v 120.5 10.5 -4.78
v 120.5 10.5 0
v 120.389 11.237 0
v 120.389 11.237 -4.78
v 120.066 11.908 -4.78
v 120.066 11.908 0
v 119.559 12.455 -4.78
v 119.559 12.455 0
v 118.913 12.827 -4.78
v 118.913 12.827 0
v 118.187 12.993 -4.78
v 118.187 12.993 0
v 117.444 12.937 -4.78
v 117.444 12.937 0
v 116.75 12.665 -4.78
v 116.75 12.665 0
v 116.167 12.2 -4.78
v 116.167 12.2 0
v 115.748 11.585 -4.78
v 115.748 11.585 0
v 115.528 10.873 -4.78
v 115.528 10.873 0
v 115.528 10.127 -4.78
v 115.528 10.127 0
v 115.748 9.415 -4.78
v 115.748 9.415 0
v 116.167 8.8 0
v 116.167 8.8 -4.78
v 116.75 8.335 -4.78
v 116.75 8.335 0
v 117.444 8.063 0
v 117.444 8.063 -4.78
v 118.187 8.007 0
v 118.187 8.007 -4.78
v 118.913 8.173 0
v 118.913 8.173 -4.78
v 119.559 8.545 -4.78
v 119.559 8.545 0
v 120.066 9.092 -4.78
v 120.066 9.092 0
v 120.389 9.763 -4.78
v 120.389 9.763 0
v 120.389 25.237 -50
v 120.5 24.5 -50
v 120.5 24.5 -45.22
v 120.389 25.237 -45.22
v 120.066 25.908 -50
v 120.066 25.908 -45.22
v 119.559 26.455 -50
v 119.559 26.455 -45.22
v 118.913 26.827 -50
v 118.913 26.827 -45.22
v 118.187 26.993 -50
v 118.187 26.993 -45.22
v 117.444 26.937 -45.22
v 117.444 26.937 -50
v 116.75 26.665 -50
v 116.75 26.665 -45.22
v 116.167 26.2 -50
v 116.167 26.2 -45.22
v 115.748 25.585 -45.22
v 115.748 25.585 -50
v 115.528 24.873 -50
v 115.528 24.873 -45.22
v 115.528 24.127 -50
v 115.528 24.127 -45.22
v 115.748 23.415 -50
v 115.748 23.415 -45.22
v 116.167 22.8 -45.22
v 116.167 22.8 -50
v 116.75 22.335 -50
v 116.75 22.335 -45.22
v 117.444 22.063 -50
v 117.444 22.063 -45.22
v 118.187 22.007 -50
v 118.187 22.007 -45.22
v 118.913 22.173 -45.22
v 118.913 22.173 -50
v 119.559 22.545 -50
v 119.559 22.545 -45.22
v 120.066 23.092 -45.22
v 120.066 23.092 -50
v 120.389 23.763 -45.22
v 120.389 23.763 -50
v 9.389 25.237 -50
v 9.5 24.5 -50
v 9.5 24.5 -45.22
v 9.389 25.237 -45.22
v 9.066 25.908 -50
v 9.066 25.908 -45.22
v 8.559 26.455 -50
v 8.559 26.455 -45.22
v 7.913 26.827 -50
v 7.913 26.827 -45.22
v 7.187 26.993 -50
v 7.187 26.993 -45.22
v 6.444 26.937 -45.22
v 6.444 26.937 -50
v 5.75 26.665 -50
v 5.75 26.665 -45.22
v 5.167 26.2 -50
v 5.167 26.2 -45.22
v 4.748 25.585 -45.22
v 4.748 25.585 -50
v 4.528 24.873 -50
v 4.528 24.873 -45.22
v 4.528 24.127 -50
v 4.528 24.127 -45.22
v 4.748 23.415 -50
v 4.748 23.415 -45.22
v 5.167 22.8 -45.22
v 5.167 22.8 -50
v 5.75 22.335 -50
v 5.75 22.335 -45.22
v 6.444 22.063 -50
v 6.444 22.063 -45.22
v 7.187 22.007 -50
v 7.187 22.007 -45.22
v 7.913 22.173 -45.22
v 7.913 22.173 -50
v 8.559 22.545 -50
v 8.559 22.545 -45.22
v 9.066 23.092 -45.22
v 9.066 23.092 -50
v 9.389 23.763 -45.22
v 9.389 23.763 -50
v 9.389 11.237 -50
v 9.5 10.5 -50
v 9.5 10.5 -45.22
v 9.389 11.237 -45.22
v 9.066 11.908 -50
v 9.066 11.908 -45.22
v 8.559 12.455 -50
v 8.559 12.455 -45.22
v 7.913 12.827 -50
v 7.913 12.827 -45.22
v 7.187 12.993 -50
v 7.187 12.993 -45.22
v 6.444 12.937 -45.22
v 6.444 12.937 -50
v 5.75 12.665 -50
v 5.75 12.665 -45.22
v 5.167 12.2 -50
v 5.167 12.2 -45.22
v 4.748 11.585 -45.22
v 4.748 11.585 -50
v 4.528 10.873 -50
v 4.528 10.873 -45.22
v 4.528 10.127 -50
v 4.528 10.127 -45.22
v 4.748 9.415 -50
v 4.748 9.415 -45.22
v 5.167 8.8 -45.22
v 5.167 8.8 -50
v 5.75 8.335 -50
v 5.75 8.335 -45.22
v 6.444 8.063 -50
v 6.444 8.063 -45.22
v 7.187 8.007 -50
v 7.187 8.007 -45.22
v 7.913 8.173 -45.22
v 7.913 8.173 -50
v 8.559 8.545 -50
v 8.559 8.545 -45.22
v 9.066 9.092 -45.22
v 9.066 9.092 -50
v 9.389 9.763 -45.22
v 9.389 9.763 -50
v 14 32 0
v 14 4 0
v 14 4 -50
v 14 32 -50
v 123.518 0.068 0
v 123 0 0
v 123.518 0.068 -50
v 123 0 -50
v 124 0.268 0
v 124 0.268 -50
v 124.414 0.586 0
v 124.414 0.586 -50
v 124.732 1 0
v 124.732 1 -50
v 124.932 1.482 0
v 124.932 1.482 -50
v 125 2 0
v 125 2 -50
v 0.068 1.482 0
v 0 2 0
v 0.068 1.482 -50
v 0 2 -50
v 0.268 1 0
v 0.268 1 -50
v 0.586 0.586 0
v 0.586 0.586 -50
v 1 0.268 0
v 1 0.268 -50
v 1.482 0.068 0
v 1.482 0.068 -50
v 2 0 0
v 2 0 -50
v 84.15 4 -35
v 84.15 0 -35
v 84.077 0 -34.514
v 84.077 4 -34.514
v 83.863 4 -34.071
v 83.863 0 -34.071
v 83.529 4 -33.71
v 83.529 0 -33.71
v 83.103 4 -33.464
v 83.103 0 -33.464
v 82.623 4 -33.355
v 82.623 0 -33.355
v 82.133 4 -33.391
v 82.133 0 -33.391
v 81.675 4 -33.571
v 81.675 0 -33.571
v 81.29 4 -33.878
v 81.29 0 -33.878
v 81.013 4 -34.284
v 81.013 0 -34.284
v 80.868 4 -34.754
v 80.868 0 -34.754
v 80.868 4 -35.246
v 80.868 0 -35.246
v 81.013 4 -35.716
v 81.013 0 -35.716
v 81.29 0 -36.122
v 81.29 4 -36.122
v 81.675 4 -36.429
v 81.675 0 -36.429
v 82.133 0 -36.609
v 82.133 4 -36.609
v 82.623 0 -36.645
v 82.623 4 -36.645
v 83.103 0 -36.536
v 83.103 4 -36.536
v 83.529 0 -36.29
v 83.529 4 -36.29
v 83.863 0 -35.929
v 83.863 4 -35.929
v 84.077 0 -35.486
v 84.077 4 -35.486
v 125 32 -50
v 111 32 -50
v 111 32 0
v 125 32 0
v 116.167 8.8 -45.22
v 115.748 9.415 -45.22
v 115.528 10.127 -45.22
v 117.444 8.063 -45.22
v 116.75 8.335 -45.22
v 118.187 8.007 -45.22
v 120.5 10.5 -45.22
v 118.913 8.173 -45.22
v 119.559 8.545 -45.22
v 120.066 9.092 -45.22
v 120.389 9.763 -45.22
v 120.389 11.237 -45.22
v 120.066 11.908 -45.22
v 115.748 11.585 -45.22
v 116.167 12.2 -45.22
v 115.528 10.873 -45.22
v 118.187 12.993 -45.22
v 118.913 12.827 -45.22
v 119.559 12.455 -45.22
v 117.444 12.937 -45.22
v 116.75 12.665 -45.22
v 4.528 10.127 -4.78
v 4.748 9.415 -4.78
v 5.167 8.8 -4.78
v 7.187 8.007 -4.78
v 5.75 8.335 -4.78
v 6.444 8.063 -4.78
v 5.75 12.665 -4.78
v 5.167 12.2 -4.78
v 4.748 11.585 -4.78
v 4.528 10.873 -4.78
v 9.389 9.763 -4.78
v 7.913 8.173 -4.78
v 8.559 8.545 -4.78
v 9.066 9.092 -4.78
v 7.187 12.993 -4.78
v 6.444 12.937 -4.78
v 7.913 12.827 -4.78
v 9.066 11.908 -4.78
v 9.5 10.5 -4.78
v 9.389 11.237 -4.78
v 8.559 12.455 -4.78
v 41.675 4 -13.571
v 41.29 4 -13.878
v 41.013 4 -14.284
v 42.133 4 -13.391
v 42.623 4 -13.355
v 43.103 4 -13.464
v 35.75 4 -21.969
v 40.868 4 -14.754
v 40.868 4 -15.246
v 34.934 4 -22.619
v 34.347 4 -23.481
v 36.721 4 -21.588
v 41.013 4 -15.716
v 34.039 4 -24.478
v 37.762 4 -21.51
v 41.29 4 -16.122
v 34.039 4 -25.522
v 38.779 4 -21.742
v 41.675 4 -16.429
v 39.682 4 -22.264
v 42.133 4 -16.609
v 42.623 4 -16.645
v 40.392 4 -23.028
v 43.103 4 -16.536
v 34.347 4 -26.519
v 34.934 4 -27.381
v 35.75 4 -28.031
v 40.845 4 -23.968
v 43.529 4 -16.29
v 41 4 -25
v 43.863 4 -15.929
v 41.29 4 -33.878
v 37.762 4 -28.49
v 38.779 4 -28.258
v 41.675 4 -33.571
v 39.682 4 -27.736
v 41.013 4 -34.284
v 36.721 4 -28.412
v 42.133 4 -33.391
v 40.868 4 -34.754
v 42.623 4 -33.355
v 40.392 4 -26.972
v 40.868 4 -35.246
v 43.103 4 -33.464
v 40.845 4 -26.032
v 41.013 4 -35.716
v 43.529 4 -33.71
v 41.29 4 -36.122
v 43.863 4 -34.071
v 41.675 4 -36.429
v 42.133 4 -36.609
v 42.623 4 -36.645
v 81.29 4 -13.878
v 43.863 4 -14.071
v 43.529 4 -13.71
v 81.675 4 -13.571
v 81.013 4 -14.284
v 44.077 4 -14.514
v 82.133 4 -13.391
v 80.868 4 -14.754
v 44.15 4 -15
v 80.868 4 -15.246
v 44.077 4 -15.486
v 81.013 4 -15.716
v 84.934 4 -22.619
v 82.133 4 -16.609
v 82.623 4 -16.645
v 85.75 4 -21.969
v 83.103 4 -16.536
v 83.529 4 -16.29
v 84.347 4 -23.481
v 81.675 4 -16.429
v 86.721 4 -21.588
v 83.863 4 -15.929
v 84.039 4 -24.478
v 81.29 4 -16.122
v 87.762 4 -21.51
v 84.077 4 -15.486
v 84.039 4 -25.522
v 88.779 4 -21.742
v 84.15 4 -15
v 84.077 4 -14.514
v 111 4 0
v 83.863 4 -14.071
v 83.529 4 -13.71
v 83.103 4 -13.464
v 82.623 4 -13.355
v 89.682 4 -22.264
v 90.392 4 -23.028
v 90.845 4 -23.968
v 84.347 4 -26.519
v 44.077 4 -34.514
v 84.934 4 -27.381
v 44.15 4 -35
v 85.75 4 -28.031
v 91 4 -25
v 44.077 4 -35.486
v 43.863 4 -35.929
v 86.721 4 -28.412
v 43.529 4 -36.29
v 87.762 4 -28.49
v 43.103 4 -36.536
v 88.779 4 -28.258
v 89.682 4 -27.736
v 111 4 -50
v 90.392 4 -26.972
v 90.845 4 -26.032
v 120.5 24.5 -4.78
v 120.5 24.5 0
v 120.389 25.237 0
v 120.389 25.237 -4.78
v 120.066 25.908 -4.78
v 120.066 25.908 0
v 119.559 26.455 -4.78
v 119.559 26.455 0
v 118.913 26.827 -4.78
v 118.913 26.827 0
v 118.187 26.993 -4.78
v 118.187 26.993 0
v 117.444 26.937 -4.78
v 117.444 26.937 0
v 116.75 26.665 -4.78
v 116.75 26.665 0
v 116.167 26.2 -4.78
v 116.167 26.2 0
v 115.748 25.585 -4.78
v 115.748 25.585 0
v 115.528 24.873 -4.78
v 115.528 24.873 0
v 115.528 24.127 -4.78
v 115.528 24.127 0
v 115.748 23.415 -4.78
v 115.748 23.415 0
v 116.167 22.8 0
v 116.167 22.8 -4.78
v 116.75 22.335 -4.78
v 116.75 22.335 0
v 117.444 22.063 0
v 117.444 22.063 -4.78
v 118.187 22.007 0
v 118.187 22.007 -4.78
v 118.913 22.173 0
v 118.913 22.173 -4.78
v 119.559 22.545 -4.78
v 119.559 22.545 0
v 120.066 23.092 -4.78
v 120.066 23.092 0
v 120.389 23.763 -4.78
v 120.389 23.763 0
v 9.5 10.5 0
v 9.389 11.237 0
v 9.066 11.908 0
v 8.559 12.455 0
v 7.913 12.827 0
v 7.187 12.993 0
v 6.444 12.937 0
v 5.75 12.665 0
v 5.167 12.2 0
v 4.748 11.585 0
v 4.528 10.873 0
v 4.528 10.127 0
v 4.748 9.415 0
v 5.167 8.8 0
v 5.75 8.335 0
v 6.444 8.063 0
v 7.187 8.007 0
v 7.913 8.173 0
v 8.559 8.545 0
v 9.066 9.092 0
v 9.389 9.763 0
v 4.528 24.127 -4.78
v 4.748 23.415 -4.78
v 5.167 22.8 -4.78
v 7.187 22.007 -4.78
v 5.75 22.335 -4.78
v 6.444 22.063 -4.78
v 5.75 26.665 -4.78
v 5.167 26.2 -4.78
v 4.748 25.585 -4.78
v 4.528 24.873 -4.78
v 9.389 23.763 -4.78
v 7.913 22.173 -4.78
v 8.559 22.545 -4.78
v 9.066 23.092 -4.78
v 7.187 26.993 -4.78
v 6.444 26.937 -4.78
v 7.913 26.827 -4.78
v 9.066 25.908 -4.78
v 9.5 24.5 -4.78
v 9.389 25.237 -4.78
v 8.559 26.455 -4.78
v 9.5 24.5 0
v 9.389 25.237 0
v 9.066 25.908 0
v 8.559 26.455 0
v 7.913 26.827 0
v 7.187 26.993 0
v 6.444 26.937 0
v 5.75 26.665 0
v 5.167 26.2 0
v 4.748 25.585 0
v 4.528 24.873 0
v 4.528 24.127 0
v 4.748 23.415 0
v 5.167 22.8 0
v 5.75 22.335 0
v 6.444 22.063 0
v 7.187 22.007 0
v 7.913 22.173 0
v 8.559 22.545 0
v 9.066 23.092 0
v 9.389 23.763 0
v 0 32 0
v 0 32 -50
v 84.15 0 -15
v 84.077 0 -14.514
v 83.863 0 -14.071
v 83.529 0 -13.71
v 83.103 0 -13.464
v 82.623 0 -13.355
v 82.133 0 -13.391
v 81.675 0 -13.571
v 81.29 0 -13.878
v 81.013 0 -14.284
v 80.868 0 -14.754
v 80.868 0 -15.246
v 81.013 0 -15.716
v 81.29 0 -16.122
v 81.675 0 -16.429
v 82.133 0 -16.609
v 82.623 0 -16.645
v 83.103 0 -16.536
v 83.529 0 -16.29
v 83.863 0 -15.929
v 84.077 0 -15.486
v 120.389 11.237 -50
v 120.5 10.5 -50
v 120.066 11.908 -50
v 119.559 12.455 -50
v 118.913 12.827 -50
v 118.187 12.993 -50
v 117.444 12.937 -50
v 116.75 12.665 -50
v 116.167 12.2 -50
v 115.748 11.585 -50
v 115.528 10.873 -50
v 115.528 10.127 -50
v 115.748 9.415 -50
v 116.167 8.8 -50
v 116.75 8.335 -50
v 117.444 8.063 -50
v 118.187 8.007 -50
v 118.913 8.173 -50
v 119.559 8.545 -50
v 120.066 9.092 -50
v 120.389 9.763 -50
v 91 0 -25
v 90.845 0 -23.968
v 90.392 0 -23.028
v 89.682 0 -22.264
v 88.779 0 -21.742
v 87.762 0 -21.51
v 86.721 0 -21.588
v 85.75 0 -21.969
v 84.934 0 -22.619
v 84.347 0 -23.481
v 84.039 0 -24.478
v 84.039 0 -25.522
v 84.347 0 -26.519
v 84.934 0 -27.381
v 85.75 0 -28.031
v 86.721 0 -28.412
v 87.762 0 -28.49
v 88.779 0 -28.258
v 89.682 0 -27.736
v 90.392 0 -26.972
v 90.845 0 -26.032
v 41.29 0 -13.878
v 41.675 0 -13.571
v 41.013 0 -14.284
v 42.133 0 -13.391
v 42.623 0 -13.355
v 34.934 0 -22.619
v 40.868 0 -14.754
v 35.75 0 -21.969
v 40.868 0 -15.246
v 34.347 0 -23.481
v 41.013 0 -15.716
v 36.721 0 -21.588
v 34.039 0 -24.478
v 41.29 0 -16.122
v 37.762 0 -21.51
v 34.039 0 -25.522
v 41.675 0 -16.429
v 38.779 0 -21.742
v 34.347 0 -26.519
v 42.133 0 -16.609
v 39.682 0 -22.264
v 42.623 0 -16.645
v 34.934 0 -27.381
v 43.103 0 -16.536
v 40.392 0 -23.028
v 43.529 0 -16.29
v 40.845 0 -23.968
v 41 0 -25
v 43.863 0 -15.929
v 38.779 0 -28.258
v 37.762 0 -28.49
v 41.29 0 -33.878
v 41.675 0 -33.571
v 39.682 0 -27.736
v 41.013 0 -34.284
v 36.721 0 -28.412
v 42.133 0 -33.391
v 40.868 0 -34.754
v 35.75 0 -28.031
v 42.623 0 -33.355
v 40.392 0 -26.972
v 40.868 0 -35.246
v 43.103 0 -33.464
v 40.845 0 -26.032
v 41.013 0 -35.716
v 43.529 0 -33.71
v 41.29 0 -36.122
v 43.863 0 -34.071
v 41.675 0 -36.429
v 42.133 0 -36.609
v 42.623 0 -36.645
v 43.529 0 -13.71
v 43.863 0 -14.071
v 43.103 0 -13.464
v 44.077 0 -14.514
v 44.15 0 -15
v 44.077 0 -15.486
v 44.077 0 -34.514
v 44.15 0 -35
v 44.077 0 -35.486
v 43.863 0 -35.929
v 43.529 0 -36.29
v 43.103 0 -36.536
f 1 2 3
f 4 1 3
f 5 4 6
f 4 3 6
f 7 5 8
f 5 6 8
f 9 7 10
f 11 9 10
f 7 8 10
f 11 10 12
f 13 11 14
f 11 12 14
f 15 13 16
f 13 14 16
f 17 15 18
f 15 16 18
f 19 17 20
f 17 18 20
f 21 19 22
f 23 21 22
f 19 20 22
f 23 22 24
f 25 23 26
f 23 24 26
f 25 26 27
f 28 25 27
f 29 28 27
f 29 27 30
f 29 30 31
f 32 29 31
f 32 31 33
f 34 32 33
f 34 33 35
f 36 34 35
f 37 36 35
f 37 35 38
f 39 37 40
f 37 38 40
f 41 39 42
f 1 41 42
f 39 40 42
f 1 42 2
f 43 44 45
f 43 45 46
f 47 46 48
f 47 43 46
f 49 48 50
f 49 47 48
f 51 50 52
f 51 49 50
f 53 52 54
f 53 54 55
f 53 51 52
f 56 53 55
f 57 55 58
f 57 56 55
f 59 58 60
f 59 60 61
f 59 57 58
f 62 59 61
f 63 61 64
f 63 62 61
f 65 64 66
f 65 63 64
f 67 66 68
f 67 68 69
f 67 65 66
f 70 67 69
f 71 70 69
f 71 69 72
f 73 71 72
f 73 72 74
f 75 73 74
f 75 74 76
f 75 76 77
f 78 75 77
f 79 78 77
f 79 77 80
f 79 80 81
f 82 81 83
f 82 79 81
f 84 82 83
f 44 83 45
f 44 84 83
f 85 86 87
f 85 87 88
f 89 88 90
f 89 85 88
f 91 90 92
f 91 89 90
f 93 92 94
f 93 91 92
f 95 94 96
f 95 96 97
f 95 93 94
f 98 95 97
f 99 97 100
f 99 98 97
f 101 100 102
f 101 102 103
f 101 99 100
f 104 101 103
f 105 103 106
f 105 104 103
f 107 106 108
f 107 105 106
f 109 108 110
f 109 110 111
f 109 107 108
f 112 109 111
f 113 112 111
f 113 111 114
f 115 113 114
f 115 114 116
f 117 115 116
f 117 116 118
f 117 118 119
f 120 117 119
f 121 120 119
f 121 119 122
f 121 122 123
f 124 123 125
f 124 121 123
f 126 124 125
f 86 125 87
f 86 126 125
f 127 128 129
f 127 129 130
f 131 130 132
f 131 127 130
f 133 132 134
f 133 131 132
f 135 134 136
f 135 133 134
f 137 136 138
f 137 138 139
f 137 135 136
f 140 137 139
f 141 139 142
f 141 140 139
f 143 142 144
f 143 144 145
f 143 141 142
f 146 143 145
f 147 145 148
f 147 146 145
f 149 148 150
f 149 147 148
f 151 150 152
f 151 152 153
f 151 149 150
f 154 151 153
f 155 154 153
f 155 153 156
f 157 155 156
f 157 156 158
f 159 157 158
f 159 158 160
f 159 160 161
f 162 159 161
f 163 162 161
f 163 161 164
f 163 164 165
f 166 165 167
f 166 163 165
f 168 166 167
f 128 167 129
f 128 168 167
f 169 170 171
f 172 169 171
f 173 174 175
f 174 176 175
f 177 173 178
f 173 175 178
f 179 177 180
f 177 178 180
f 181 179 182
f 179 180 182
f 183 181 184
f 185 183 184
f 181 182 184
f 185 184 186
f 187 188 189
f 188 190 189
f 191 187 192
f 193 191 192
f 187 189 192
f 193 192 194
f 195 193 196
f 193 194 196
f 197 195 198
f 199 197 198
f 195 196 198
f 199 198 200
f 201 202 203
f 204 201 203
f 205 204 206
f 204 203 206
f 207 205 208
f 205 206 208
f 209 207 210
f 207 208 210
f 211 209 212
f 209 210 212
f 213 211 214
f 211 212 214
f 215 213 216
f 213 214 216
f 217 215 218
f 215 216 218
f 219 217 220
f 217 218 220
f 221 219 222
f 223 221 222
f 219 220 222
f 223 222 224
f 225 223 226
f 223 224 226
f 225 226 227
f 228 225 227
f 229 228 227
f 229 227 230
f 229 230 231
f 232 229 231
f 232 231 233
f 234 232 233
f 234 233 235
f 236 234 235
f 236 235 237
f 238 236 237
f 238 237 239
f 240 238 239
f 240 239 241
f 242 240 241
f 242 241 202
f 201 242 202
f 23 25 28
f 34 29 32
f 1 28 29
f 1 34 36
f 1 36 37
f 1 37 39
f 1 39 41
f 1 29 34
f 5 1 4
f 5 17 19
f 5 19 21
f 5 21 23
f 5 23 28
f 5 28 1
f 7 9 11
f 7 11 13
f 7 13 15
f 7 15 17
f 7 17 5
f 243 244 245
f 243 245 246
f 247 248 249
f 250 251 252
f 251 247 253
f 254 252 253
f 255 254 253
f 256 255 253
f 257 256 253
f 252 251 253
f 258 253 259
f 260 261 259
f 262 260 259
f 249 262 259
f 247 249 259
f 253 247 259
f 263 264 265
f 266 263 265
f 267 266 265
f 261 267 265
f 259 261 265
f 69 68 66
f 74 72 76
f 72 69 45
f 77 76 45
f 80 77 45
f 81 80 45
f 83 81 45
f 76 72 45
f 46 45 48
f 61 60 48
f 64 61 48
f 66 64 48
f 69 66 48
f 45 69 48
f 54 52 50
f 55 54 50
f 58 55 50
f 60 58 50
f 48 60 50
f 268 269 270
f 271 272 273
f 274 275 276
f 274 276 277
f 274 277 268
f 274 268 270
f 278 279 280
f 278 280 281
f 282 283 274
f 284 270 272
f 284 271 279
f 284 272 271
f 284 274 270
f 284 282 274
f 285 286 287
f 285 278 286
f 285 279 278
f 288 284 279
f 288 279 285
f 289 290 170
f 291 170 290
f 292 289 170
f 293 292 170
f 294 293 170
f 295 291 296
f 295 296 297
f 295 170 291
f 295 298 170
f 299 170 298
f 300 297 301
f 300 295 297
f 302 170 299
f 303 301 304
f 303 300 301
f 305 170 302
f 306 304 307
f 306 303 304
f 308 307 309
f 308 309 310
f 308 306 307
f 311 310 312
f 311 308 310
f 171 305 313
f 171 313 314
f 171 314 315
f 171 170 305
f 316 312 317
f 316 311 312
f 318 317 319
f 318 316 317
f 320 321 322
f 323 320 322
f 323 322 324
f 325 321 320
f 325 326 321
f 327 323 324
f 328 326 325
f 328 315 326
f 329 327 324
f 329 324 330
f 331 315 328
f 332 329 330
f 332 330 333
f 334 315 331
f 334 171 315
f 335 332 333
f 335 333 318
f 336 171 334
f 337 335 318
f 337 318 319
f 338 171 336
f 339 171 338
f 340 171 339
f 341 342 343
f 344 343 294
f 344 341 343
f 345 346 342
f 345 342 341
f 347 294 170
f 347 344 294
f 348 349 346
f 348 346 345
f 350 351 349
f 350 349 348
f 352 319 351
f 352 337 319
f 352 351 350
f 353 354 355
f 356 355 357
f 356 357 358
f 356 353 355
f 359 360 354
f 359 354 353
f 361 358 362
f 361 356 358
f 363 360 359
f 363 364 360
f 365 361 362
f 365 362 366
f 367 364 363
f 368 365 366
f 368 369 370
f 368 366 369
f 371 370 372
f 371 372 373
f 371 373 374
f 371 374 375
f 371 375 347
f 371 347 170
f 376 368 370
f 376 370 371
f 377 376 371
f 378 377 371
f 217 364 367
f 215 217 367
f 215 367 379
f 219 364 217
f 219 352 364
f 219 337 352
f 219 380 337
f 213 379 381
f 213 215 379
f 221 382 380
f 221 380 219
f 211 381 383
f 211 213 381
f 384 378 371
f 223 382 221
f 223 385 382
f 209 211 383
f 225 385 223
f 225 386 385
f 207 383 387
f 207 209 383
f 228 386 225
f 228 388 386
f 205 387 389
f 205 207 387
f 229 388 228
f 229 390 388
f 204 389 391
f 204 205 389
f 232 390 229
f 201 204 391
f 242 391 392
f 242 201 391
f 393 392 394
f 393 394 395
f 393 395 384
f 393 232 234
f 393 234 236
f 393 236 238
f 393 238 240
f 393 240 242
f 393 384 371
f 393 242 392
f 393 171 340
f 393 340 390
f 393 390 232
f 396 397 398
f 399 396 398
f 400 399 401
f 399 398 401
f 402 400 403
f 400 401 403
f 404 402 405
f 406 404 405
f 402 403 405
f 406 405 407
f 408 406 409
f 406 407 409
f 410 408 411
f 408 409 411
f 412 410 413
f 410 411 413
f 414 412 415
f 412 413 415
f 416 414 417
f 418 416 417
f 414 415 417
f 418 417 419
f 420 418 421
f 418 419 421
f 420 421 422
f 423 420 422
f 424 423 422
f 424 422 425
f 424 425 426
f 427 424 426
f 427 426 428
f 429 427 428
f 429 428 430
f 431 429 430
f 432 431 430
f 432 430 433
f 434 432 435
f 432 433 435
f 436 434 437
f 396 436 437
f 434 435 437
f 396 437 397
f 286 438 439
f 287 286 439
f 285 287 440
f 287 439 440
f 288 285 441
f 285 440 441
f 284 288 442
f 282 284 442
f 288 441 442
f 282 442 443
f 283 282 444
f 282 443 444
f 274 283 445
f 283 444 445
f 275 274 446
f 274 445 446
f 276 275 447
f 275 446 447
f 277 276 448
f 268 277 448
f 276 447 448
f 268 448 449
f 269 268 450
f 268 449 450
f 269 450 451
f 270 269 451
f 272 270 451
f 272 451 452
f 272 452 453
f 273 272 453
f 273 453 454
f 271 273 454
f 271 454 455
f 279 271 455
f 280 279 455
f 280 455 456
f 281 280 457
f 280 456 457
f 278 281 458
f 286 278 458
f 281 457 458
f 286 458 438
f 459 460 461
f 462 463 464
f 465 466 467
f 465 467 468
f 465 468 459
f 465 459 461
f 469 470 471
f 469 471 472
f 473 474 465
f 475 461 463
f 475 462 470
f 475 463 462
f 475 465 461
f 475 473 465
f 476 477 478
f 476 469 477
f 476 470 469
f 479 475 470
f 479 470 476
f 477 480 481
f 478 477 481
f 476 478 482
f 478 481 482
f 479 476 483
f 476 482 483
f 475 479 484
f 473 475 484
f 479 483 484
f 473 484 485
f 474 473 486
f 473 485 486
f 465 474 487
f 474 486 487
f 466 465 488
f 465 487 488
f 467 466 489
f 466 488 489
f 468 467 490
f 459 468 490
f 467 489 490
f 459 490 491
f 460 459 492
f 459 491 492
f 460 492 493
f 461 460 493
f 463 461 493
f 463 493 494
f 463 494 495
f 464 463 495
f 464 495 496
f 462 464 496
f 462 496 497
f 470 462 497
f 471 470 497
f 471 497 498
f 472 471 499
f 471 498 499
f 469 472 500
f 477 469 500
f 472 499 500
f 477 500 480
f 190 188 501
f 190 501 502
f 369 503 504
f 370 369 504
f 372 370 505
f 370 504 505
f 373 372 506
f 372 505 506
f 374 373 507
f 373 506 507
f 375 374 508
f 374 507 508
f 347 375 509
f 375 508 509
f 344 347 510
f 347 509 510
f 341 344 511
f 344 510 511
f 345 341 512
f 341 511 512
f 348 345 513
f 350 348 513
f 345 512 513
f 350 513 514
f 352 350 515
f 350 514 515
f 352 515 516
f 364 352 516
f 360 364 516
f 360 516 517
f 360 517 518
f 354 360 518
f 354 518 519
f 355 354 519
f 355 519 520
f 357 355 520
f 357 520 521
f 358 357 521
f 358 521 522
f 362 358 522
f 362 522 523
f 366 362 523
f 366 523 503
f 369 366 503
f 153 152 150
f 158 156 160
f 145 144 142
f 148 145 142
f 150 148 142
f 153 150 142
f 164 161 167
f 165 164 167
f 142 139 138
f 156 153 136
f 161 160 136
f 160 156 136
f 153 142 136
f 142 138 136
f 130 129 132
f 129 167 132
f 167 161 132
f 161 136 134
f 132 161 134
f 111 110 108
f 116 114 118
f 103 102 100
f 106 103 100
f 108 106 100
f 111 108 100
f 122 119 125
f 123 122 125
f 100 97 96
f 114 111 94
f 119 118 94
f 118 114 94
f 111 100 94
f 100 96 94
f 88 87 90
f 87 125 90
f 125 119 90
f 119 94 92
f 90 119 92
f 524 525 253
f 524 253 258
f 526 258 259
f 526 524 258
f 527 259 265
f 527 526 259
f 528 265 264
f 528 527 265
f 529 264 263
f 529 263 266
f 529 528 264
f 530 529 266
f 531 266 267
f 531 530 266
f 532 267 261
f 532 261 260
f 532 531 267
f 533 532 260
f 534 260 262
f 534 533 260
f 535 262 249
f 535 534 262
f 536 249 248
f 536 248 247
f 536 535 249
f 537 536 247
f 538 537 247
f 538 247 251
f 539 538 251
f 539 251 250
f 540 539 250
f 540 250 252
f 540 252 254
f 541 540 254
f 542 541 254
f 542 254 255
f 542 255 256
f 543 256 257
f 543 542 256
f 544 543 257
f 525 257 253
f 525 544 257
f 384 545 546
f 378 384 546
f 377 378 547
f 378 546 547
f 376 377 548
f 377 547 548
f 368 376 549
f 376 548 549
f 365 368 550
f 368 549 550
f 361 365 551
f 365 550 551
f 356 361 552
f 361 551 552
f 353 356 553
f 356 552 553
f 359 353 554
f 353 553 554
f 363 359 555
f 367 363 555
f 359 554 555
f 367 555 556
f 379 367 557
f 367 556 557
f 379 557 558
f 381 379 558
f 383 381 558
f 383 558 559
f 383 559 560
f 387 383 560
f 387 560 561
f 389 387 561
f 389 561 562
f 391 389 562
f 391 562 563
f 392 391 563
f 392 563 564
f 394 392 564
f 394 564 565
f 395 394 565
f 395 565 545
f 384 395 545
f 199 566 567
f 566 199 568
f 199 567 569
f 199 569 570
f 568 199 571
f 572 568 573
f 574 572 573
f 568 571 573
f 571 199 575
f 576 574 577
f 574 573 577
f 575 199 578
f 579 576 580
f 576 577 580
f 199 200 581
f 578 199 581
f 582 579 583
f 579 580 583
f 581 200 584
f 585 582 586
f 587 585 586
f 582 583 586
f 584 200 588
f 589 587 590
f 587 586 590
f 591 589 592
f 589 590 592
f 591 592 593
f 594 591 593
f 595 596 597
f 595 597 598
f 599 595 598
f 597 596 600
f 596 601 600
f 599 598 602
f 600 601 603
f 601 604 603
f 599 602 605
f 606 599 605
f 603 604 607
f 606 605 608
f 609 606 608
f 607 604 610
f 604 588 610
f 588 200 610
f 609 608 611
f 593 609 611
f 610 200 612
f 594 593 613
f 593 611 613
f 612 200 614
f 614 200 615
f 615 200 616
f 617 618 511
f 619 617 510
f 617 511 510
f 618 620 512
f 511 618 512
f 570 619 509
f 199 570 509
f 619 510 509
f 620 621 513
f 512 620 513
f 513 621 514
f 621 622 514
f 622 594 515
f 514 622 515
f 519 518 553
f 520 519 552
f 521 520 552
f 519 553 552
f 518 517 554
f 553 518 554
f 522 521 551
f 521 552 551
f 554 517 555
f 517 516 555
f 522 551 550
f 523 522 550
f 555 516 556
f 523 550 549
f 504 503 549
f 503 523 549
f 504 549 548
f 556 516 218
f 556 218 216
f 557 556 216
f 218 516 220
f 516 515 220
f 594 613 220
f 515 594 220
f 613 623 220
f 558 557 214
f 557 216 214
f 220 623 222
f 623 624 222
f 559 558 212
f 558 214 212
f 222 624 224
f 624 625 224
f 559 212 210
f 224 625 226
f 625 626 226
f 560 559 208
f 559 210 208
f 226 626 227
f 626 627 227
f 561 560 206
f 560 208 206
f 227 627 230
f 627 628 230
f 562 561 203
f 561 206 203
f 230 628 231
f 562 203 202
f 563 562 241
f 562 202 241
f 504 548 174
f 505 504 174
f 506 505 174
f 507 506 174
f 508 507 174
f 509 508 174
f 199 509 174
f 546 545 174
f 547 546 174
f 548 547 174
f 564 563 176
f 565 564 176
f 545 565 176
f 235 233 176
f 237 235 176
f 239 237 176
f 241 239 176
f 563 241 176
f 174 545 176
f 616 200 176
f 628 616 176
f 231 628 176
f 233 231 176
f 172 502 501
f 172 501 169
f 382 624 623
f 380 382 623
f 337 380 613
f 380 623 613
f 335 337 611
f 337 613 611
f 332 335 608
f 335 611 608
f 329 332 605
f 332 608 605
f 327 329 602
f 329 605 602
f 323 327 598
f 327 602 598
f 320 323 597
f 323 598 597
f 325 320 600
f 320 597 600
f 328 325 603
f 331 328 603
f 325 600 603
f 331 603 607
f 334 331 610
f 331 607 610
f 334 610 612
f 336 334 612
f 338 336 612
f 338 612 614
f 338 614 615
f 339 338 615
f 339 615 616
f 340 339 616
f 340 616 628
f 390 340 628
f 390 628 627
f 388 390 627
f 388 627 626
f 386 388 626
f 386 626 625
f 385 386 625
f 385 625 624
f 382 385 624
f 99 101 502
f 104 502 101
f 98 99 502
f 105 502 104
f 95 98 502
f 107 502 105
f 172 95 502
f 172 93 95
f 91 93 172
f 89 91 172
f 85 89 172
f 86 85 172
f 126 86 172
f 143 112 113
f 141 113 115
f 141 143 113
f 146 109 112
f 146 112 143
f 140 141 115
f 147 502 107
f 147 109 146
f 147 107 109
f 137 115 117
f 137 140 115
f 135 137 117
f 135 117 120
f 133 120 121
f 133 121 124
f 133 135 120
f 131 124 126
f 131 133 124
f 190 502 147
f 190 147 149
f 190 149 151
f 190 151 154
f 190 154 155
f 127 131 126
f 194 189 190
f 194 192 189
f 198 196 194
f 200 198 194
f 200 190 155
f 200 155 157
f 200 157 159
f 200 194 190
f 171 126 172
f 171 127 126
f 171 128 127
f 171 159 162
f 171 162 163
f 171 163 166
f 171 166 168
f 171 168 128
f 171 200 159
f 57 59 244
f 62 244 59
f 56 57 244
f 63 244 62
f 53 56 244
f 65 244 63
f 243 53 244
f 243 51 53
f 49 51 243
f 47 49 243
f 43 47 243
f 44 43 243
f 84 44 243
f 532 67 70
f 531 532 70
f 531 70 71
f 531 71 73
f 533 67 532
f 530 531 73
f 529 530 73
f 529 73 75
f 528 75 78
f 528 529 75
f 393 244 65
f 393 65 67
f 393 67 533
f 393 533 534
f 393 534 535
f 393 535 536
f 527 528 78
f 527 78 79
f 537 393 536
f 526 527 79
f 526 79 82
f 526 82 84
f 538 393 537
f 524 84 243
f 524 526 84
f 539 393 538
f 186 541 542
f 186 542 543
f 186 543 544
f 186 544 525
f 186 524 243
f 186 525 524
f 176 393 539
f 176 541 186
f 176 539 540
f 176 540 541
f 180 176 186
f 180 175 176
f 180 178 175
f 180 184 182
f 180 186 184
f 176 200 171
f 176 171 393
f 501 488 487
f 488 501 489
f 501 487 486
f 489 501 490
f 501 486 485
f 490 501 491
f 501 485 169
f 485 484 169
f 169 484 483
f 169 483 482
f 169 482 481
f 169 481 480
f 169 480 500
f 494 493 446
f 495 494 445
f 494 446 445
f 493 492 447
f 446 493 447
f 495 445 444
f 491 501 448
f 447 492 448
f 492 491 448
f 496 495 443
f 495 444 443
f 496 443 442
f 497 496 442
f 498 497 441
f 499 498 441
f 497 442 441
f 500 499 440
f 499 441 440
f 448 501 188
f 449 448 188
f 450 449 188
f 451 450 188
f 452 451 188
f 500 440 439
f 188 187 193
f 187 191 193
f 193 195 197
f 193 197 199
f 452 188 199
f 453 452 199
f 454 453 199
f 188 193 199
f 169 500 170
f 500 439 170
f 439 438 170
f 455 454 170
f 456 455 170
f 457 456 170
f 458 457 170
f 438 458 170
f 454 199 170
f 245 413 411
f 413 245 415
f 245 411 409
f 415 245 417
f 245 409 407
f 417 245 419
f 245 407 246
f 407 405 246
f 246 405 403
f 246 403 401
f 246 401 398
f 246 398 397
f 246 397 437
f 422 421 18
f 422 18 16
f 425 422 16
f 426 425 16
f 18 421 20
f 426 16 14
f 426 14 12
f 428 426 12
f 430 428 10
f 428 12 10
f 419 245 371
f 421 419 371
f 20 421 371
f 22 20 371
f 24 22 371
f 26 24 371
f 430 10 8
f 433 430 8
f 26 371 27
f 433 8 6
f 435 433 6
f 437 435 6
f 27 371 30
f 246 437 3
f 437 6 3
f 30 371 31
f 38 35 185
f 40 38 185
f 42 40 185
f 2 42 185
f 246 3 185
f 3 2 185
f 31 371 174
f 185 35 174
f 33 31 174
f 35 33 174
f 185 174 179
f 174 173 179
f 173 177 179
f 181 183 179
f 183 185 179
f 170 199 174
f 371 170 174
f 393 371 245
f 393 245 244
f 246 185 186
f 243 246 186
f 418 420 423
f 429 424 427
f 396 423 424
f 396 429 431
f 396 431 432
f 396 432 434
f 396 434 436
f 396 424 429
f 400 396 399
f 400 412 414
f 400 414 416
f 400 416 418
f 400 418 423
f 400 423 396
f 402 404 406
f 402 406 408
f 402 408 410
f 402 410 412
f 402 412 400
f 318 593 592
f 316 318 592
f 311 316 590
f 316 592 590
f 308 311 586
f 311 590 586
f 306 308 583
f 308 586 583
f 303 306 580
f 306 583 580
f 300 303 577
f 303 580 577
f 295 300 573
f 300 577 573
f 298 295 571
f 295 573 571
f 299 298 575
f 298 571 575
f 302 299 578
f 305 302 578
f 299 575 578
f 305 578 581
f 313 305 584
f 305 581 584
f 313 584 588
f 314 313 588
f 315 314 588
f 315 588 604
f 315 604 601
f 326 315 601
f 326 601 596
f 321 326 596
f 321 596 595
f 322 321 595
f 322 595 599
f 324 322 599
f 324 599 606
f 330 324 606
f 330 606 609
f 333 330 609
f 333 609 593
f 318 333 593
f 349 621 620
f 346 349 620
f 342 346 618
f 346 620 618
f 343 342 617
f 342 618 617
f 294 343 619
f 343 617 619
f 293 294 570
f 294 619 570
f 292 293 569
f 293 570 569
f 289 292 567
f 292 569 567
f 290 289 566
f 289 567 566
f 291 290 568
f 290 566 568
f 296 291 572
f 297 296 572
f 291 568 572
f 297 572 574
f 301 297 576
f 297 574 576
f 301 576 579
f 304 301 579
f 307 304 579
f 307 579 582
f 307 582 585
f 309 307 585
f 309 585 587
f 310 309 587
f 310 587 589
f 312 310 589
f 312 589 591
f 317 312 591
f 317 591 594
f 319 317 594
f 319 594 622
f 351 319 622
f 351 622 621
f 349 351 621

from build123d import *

# Parameters (mm, degrees)
SKETCH1_W           = 125
SKETCH1_H           = 50
BOSS_EXTRUDE1_DEPTH = 4
SKETCH2_W           = 14
SKETCH2_H           = 50
BOSS_EXTRUDE2_DEPTH = 28
SKETCH3_R           = 2.5
CUT_EXTRUDE1_DEPTH  = 4.78
SKETCH4_R           = 1.65
SKETCH4_R_2         = 3.5
CUT_EXTRUDE2_DEPTH  = 33
FILLET1_R           = 2


with BuildPart() as part:
    # Sketch1 → Boss-Extrude1 (new body)
    with BuildSketch(Plane(origin=(0, 0, 0), x_dir=(1, 0, 0), z_dir=(0, 1, 0))):
        with Locations((62.5, 25)):
            Rectangle(SKETCH1_W, SKETCH1_H)
    extrude(amount=BOSS_EXTRUDE1_DEPTH)

    # Sketch2 → Boss-Extrude2 (add)
    with BuildSketch(Plane(origin=(0, 4, 0), x_dir=(1, 0, 0), z_dir=(0, 1, 0))):
        with Locations((7, 25)):
            Rectangle(SKETCH2_W, SKETCH2_H)
        with Locations((118, 25)):
            Rectangle(SKETCH2_W, SKETCH2_H)
    extrude(amount=BOSS_EXTRUDE2_DEPTH)

    # Sketch3 → Cut-Extrude1 (cut)
    with BuildSketch(Plane.XY):
        with Locations((7, 24.5)):
            Circle(SKETCH3_R)
        with Locations((7, 10.5)):
            Circle(SKETCH3_R)
        with Locations((118, 10.5)):
            Circle(SKETCH3_R)
        with Locations((118, 24.5)):
            Circle(SKETCH3_R)
    cut_extrude1 = extrude(amount=-CUT_EXTRUDE1_DEPTH, mode=Mode.SUBTRACT)

    # Mirror1: Cut-Extrude1 across plane
    add(cut_extrude1.mirror(Plane.XY.offset(-25)), mode=Mode.SUBTRACT)

    # Sketch4 → Cut-Extrude2 (cut, through all)
    with BuildSketch(Plane.XZ):
        with Locations((82.5, -15)):
            Circle(SKETCH4_R)
        with Locations((42.5, -15)):
            Circle(SKETCH4_R)
        with Locations((82.5, -35)):
            Circle(SKETCH4_R)
        with Locations((42.5, -35)):
            Circle(SKETCH4_R)
        with Locations((37.5, -25)):
            Circle(SKETCH4_R_2)
        with Locations((87.5, -25)):
            Circle(SKETCH4_R_2)
    extrude(amount=-CUT_EXTRUDE2_DEPTH, mode=Mode.SUBTRACT)

    # Fillet1
    fillet1_edges = [part.edges().sort_by_distance(p)[0] for p in [
        (125, 0, -25),
        (0, 0, -25),
    ]]
    fillet(fillet1_edges, radius=FILLET1_R)


solid = part.part
